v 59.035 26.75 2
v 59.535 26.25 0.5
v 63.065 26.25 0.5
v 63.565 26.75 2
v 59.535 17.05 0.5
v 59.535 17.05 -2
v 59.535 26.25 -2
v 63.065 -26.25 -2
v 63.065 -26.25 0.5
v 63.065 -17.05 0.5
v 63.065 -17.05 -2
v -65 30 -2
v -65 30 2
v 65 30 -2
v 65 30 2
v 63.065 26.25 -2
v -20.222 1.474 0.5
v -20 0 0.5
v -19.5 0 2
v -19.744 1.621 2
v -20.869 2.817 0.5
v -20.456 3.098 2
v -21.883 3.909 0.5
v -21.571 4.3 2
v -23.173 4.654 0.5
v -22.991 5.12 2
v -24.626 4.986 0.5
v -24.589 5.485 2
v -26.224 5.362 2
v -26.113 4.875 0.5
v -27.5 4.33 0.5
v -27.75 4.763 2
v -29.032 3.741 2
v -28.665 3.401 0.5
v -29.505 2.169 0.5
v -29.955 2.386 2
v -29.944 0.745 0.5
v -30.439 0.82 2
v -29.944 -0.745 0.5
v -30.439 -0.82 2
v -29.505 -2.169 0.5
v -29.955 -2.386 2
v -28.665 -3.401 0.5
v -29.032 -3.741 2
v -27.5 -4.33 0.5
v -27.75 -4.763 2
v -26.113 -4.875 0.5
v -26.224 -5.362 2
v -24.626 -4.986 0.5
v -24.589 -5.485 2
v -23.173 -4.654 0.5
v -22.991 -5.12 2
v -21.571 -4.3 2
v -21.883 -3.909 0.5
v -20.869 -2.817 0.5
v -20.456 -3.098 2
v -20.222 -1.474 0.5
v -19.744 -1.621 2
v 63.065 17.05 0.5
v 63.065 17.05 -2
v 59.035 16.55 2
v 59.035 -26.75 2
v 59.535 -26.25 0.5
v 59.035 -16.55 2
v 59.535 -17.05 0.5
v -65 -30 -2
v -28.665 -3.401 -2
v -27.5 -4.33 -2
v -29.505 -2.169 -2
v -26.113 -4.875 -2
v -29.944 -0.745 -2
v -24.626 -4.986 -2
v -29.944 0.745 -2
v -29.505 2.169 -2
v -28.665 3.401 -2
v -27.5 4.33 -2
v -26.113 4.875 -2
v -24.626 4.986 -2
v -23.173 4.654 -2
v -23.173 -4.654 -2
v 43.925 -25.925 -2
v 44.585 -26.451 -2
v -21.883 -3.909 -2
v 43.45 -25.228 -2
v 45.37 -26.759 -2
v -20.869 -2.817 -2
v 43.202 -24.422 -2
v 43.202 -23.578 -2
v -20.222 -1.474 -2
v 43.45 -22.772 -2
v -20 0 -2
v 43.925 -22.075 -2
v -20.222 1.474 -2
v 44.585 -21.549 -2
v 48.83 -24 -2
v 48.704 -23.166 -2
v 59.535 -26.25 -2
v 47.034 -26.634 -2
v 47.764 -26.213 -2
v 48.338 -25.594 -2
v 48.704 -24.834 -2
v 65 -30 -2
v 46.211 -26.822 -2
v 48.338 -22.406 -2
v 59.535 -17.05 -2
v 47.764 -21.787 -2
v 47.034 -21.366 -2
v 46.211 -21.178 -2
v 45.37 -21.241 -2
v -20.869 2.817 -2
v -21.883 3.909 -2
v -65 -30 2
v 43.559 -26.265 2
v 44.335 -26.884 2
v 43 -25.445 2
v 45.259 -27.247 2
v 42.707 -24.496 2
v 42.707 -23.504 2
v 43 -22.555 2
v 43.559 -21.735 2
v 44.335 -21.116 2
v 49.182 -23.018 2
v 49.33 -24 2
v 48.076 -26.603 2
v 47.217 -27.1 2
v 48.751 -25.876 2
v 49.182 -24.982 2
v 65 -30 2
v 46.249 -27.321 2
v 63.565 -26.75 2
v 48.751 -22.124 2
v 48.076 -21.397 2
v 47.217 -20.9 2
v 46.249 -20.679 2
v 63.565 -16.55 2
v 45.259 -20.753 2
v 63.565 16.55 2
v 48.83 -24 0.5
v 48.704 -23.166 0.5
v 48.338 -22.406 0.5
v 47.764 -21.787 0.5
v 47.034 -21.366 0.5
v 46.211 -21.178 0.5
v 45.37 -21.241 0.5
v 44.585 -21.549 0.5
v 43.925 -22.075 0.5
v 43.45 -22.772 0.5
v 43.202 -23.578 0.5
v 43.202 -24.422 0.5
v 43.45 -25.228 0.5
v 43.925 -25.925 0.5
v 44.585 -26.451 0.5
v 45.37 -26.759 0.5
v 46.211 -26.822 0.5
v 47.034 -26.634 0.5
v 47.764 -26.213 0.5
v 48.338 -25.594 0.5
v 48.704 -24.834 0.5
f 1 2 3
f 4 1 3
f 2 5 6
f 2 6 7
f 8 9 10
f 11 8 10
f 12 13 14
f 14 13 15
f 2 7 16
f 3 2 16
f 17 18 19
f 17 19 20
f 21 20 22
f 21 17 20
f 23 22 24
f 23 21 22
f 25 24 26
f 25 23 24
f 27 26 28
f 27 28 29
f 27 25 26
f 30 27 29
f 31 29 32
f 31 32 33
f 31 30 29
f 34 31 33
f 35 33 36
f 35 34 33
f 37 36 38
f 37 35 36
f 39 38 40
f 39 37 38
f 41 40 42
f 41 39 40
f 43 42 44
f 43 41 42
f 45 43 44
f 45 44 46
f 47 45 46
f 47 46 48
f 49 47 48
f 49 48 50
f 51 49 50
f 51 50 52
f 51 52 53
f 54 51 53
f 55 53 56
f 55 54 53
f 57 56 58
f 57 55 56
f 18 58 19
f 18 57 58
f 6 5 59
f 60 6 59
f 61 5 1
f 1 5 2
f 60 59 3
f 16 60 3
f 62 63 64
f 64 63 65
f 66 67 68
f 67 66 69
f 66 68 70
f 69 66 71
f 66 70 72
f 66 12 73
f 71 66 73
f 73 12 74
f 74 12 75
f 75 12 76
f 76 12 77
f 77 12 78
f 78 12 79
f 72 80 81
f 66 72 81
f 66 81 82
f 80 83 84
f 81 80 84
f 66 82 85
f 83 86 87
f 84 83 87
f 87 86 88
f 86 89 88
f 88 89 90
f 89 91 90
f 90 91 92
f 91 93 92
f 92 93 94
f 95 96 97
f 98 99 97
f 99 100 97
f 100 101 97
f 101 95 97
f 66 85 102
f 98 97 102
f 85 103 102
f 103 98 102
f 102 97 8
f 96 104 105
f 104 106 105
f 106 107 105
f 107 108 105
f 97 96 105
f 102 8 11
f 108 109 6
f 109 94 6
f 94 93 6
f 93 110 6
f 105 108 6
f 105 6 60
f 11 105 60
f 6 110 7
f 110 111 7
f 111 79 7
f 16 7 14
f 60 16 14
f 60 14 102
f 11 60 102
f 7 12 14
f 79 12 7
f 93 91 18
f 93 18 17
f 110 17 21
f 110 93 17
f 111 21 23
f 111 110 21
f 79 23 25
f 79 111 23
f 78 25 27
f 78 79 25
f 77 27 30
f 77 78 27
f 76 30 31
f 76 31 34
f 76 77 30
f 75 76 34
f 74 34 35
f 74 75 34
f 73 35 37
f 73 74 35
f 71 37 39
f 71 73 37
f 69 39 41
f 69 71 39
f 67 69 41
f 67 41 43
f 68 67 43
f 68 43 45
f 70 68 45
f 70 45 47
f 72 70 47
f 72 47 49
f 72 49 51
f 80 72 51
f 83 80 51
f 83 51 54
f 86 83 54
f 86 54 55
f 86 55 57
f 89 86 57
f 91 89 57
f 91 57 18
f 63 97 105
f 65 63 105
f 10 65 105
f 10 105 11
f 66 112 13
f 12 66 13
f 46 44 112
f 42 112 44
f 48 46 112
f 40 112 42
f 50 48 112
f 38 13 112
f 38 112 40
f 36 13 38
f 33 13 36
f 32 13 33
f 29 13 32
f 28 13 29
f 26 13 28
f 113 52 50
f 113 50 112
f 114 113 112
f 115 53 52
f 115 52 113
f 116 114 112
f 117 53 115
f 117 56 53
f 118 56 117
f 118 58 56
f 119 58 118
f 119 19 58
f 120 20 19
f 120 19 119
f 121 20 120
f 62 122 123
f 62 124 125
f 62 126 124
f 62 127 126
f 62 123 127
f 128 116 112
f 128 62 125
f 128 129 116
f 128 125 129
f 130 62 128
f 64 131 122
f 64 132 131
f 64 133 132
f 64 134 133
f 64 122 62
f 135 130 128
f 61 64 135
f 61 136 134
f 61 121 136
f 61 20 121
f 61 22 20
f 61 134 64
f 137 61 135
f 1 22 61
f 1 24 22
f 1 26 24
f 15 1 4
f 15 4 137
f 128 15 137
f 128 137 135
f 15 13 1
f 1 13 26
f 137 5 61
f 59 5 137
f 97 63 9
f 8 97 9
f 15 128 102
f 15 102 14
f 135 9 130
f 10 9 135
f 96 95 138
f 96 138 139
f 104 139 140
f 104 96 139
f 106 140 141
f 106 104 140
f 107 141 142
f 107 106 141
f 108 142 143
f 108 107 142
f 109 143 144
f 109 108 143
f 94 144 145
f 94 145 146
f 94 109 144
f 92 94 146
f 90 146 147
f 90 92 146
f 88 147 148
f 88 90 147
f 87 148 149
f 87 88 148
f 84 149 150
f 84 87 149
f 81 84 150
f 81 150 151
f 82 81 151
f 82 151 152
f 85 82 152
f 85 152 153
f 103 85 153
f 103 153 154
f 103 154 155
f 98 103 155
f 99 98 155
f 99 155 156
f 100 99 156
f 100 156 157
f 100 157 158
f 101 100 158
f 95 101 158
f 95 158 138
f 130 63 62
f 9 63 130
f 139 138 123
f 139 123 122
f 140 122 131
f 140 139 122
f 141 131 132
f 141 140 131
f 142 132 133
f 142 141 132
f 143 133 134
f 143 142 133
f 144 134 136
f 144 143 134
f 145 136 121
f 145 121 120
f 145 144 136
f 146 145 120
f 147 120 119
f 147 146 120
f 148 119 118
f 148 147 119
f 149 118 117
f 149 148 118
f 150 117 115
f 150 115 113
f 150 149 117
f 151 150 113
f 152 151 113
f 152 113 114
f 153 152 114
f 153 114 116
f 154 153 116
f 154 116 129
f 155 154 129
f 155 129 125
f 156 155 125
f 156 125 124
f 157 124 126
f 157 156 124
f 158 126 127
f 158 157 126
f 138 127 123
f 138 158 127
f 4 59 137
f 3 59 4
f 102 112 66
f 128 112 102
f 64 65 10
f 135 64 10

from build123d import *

# Parameters (mm, degrees)
SKETCH1_W           = 130
SKETCH1_H           = 60
SKETCH1_R           = 5
SKETCH1_R_2         = 2.83
SKETCH1_W_2         = 3.53
SKETCH1_H_2         = 9.2
BOSS_EXTRUDE1_DEPTH = 2
CHAMFER1_SIZE       = 0.5
CHAMFER1_SIZE2      = 1.5


with BuildPart() as part:
    # Sketch1 → Boss-Extrude1 (new, symmetric)
    with BuildSketch(Plane.XY):
        Rectangle(SKETCH1_W, SKETCH1_H)
        with Locations((-25, 0)):
            Circle(SKETCH1_R, mode=Mode.SUBTRACT)
        with Locations((46, -24)):
            Circle(SKETCH1_R_2, mode=Mode.SUBTRACT)
        with Locations((61.3, 21.65)):
            Rectangle(SKETCH1_W_2, SKETCH1_H_2, mode=Mode.SUBTRACT)
        with Locations((61.3, -21.65)):
            Rectangle(SKETCH1_W_2, SKETCH1_H_2, mode=Mode.SUBTRACT)
    extrude(amount=BOSS_EXTRUDE1_DEPTH, both=True)

    # Chamfer1
    chamfer1_edges = [part.edges().sort_by_distance(p)[0] for p in [
        (59.535, -21.65, 2),
        (61.3, -26.25, 2),
        (63.065, -21.65, 2),
        (61.3, -17.05, 2),
        (43.17, -24, 2),
        (-30, 0, 2),
        (59.535, 21.65, 2),
        (61.3, 17.05, 2),
        (63.065, 21.65, 2),
        (61.3, 26.25, 2),
    ]]
    chamfer1_side = [part.faces().sort_by_distance(p)[0] for p in [
        (-0.416106653, 0.079128468, 2),
    ]]
    chamfer(chamfer1_edges, length=CHAMFER1_SIZE, length2=CHAMFER1_SIZE2, reference=chamfer1_side[0])


solid = part.part
